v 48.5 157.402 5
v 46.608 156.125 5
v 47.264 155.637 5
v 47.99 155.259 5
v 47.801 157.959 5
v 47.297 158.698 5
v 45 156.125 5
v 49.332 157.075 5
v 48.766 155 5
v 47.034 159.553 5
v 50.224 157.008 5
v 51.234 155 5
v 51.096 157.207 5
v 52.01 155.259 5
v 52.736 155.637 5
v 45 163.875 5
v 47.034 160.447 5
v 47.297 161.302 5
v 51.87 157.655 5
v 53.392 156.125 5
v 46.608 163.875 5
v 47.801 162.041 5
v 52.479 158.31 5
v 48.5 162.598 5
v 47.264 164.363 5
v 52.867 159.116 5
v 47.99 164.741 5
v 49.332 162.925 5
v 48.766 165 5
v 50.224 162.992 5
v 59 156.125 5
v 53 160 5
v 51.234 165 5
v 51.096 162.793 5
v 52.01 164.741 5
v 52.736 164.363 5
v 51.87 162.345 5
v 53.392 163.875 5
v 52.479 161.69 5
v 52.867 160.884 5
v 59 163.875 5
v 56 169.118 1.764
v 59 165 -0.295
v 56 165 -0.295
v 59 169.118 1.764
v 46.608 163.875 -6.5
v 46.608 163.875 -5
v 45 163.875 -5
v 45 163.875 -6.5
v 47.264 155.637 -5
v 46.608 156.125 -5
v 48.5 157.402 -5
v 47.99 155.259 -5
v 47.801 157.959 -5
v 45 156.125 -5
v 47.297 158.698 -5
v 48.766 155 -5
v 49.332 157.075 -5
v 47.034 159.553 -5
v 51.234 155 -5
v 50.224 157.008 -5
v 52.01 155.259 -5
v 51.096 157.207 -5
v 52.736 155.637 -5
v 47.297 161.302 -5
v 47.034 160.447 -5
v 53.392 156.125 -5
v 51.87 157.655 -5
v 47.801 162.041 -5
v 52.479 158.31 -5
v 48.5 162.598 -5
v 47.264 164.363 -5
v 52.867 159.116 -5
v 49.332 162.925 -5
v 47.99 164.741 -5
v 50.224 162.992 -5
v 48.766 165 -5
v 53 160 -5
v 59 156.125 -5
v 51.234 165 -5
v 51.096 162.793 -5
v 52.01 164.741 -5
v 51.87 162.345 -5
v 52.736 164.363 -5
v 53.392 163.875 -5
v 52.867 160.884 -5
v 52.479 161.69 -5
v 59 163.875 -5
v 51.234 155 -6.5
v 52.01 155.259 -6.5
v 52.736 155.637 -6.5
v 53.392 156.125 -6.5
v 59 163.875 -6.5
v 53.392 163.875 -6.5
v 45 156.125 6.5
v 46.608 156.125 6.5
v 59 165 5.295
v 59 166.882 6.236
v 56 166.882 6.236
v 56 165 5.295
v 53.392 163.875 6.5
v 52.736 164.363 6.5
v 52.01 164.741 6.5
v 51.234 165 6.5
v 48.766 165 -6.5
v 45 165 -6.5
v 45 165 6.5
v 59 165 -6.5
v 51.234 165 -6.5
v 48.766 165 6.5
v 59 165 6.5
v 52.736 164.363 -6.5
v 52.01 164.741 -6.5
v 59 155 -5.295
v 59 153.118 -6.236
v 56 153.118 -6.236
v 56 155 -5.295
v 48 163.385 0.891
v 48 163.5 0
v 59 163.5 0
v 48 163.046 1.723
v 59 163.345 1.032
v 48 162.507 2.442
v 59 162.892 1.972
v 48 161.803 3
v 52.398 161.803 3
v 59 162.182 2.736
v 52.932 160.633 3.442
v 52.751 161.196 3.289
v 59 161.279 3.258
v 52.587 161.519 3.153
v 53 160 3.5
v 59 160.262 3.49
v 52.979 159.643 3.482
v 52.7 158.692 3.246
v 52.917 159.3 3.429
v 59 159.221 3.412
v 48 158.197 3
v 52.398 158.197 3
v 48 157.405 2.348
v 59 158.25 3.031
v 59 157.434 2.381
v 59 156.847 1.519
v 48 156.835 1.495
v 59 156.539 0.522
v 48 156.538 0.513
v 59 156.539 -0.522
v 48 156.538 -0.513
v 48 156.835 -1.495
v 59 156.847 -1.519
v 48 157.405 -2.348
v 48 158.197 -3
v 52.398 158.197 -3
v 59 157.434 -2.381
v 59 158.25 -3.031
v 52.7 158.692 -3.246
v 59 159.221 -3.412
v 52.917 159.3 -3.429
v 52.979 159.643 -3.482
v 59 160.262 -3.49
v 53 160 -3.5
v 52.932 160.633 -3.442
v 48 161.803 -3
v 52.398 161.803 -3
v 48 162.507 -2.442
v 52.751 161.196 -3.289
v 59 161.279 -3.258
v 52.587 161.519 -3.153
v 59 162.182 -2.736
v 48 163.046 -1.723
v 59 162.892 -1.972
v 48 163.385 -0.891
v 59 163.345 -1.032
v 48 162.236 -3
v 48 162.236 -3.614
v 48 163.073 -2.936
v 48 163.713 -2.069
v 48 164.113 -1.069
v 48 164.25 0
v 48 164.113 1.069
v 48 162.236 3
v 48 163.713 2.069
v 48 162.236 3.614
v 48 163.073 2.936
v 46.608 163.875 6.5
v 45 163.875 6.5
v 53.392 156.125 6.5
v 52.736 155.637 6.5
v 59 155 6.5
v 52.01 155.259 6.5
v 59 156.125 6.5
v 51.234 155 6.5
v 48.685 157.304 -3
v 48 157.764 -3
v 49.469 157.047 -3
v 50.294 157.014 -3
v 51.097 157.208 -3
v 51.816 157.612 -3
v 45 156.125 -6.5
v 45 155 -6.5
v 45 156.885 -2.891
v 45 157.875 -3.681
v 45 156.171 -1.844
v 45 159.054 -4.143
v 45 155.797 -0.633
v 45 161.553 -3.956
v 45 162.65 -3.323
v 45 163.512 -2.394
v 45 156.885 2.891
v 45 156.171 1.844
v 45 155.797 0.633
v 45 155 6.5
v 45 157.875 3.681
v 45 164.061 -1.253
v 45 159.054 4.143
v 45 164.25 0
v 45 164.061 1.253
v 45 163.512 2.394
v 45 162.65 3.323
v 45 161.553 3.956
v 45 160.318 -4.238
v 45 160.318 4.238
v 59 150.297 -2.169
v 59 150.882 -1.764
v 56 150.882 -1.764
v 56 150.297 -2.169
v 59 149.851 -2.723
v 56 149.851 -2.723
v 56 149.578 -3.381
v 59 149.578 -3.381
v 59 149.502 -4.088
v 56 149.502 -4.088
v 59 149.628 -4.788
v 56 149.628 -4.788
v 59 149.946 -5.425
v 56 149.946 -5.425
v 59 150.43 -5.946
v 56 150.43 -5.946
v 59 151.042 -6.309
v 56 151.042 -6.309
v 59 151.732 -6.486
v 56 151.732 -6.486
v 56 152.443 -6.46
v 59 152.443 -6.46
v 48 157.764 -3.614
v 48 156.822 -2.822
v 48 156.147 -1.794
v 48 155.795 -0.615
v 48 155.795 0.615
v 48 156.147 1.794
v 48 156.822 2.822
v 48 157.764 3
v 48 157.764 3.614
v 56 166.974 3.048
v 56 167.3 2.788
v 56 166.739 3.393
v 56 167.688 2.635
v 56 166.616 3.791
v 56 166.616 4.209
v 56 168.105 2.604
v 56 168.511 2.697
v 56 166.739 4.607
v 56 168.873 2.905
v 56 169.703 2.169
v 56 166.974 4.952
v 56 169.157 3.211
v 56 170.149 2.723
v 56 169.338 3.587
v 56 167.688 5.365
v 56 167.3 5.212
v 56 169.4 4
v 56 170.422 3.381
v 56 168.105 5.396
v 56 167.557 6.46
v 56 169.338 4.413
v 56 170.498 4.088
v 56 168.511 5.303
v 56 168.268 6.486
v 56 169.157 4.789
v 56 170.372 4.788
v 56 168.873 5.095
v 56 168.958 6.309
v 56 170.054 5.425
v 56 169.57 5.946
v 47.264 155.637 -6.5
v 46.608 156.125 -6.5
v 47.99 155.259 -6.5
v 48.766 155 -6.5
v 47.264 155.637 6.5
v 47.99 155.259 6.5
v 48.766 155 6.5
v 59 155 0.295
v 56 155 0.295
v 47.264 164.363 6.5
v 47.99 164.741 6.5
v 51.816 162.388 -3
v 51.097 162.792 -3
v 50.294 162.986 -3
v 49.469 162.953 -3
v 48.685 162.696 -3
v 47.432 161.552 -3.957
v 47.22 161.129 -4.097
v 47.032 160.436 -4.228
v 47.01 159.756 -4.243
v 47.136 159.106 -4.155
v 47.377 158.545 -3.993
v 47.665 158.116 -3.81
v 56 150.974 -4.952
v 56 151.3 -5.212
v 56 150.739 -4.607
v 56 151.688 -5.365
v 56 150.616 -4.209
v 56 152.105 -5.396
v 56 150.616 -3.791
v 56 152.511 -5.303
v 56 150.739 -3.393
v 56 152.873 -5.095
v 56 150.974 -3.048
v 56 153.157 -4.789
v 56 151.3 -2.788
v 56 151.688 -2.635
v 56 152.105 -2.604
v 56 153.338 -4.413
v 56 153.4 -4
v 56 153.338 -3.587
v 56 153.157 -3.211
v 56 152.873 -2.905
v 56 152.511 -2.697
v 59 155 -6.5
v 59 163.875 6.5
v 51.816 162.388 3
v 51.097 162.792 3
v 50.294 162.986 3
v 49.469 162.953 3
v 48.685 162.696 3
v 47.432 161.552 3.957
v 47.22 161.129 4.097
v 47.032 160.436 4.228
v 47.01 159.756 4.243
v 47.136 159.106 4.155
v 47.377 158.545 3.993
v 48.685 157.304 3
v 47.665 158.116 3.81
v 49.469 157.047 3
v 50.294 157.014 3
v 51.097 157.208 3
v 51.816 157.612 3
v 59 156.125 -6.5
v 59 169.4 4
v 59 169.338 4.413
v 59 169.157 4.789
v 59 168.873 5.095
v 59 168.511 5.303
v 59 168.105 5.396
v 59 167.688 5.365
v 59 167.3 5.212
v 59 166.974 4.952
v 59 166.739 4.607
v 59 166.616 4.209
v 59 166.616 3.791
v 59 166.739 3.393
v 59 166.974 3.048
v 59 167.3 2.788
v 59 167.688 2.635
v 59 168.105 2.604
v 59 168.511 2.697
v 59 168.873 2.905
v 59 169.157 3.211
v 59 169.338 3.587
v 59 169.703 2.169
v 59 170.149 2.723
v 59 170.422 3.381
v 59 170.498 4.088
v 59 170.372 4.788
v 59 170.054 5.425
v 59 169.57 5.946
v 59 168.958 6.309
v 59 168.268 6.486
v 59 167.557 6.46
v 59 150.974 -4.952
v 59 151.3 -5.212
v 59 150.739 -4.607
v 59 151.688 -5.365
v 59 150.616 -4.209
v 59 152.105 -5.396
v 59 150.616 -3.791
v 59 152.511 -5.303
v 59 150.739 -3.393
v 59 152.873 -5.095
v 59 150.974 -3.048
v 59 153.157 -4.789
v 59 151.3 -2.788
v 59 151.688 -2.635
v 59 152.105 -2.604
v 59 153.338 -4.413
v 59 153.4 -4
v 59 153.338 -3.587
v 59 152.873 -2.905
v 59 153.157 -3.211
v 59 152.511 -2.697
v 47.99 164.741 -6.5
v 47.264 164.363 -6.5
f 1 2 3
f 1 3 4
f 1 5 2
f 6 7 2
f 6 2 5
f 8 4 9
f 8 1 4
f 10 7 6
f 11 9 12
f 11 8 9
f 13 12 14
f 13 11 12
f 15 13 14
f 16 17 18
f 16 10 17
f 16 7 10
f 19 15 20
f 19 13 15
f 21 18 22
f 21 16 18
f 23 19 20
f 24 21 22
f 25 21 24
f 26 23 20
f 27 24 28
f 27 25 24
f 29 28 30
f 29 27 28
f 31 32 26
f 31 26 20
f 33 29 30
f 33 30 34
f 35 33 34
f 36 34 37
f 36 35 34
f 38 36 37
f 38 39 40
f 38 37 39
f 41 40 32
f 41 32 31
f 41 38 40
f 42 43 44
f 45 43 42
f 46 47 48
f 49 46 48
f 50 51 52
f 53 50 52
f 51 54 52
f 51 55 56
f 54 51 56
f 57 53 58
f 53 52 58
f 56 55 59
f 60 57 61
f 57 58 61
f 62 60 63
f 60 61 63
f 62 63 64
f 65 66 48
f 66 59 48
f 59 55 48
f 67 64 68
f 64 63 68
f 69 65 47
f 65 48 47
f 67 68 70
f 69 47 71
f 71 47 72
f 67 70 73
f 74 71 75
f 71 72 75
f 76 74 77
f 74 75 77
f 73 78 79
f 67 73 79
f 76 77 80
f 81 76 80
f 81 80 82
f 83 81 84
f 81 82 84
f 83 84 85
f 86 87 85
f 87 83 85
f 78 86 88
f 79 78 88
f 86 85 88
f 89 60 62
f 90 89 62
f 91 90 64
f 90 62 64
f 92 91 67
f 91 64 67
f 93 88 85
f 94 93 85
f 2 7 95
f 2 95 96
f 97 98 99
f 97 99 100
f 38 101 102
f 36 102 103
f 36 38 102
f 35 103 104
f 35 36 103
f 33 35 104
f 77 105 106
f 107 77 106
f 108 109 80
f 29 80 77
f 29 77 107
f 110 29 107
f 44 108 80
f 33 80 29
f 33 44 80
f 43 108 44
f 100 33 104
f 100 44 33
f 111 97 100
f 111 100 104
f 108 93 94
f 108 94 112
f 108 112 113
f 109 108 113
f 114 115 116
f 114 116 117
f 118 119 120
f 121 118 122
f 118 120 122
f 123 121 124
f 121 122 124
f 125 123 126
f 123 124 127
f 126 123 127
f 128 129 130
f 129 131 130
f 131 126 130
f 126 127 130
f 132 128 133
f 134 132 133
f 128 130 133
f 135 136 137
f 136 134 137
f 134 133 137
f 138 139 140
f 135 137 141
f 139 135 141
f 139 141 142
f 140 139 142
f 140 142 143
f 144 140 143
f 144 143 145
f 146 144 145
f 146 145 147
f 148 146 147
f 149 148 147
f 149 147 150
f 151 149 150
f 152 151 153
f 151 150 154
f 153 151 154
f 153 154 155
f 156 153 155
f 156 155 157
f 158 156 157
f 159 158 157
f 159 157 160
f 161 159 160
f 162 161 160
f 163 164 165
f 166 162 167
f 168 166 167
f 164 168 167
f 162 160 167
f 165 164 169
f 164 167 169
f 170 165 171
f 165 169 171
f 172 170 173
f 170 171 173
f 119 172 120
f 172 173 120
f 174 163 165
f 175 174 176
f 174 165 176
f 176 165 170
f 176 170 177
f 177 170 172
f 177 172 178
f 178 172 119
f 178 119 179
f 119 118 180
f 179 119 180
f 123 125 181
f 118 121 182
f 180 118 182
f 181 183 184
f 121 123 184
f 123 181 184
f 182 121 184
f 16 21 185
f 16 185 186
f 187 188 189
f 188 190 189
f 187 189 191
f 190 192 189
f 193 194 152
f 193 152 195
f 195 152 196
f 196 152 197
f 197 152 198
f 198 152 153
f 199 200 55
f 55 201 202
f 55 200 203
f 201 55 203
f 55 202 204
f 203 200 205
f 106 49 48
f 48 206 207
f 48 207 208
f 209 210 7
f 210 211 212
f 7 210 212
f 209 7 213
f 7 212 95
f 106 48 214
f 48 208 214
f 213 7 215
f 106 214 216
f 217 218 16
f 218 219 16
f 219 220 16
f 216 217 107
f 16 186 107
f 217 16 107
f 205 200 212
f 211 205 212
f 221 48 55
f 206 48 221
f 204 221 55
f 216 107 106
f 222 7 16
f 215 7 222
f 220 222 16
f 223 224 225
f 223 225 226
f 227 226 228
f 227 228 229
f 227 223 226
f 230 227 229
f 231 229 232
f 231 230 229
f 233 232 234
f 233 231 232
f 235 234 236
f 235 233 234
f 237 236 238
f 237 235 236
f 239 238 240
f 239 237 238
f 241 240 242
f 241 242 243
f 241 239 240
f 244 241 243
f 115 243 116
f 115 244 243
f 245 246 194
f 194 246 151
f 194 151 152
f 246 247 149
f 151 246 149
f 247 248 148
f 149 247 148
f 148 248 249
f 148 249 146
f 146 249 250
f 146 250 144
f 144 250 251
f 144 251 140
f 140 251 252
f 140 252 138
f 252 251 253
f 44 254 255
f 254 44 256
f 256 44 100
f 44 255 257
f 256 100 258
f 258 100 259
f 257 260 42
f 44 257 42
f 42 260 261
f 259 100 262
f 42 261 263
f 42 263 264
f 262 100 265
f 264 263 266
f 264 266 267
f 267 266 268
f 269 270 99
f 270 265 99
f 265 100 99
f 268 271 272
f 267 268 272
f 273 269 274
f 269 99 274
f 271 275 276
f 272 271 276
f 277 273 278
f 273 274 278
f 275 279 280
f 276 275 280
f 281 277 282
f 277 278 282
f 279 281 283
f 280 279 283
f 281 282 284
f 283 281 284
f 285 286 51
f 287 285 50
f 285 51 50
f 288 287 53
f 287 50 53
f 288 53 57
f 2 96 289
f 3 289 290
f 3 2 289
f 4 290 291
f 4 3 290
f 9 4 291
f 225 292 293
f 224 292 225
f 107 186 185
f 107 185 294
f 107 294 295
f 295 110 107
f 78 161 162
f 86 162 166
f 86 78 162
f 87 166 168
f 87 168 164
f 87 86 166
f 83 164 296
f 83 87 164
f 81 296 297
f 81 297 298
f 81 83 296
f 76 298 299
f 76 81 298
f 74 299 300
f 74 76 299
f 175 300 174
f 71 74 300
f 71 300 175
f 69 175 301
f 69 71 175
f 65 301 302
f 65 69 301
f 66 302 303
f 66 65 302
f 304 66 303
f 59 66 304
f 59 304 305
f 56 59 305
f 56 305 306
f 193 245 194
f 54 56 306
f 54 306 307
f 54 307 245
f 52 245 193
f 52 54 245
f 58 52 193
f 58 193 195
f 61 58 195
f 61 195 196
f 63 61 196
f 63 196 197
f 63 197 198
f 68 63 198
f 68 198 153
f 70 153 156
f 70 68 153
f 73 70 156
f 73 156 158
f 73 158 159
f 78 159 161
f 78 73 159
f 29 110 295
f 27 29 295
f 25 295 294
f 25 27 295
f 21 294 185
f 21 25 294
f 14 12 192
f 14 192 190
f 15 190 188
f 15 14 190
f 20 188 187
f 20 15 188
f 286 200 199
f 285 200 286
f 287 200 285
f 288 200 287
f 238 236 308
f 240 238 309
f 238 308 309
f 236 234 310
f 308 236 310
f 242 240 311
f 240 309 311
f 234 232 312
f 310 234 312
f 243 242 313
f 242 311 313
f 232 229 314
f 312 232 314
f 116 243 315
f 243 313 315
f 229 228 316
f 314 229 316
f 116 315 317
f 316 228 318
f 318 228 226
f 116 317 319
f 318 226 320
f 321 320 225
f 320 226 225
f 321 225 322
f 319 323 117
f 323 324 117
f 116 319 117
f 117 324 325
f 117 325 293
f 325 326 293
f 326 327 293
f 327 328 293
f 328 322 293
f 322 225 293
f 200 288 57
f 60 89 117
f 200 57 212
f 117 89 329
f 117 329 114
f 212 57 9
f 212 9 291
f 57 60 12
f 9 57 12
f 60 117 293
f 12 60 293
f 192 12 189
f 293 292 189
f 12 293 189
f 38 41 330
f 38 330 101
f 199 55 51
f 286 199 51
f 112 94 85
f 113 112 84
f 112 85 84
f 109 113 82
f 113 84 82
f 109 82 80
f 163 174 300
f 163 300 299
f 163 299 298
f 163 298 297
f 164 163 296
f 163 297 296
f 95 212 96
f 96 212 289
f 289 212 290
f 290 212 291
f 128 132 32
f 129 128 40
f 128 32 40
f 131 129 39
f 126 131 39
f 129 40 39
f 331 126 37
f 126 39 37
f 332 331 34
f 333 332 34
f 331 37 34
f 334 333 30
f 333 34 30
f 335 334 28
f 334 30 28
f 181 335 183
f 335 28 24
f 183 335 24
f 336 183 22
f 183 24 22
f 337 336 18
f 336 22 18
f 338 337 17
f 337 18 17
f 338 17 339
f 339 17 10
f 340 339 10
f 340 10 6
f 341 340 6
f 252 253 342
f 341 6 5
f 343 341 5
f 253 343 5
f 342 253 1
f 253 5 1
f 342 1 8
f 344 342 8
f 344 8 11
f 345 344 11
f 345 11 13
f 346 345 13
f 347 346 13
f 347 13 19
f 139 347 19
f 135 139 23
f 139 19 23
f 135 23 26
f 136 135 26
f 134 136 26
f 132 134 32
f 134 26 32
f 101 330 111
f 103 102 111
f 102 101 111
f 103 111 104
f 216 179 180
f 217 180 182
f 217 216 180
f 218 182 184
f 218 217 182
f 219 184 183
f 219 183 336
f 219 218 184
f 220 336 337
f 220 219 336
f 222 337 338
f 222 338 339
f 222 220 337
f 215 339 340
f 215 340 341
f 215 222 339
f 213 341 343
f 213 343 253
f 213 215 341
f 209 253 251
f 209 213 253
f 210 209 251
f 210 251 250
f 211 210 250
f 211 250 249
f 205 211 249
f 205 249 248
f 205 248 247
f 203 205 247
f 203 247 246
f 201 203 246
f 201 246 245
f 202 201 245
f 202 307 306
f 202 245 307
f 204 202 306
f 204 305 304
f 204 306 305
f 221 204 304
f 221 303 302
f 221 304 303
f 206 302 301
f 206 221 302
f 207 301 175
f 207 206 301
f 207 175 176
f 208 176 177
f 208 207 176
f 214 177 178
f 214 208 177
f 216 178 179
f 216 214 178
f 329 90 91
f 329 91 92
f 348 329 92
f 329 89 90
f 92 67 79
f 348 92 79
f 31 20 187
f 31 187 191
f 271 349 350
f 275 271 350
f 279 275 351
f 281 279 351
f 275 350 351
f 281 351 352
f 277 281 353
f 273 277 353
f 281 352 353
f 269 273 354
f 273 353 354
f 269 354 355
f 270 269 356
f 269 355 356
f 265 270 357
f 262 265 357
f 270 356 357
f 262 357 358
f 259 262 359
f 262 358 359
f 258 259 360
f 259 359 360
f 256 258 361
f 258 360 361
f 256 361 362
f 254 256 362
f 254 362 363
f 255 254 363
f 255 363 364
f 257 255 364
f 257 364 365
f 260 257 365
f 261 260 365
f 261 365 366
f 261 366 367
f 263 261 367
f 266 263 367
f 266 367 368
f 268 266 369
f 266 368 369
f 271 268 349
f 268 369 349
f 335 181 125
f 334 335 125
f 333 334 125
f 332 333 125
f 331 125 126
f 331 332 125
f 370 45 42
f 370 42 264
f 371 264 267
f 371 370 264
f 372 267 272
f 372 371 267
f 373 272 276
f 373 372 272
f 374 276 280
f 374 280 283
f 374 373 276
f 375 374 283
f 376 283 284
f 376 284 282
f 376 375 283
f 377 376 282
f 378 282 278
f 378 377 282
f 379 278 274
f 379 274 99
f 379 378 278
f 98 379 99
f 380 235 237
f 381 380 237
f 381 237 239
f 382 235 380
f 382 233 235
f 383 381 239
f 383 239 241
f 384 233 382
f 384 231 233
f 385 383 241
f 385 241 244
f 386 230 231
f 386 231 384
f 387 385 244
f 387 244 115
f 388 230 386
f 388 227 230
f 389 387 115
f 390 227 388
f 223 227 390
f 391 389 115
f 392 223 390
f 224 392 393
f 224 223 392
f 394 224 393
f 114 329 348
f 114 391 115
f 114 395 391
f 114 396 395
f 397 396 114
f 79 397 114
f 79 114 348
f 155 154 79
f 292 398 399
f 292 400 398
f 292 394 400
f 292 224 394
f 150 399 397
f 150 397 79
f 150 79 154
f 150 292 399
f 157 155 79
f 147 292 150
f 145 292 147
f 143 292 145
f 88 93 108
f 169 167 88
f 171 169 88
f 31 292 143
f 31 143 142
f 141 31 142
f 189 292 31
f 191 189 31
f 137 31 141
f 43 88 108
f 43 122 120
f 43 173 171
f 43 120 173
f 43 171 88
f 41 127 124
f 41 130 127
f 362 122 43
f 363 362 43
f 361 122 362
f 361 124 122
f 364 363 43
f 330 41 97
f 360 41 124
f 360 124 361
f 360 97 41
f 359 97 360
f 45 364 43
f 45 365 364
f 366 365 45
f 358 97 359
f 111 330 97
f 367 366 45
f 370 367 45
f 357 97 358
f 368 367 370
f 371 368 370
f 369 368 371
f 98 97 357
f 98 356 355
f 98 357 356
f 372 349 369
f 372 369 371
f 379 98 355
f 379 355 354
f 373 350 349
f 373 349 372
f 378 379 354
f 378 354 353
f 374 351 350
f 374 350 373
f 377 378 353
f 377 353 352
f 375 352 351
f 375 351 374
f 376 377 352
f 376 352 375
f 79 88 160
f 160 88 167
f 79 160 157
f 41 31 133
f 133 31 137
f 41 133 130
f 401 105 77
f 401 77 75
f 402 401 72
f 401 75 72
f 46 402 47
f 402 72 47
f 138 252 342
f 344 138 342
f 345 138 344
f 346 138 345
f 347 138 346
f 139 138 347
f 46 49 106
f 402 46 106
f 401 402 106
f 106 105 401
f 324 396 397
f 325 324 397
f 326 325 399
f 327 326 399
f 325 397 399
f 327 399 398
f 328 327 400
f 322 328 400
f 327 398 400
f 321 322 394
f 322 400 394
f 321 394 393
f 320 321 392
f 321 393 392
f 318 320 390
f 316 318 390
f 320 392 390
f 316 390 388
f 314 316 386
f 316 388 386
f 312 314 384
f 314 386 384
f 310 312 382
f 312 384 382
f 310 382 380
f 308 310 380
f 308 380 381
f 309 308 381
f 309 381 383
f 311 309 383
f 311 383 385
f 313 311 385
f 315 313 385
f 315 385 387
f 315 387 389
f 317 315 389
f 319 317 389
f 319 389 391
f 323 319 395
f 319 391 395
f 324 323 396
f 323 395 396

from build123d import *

# Parameters (mm, degrees)
SKETCH215_R     = 3
PAD127051_DEPTH = 2
PAD127048_DEPTH = 3
PAD127047_DEPTH = 3
SKETCH209_R     = 3.5
PAD127045_DEPTH = 30
SKETCH210_R     = 4.25
PAD127046_DEPTH = 3
SKETCH216_R     = 3
PAD127052_DEPTH = 2
SKETCH208_W     = 10
SKETCH208_H     = 13
PAD127044_DEPTH = 14
SKETCH207_R     = 1.4
PAD127043_DEPTH = 3


with BuildPart() as countersinktop:
    # Sketch215 → Pad127051 (new body)
    with BuildSketch(Plane(origin=(50, 160, 5), x_dir=(1, 0, 0), z_dir=(0, 0, 1))):
        Circle(SKETCH215_R)
    extrude(amount=-PAD127051_DEPTH)


with BuildPart() as steeringrodcutoutbottom:
    # Sketch212 → Pad127048 (new body)
    with BuildSketch(Plane(origin=(50, 160, -5), x_dir=(1, 0, 0), z_dir=(0, 0, 1))):
        with BuildLine():
            Line((9, 3.875), (3.392179, 3.875))
            ThreePointArc((3.392179, 3.875), (0, 5.15), (-3.392179, 3.875))
            Line((-3.392179, 3.875), (-8, 3.875))
            Line((-8, 3.875), (-8, -3.875))
            Line((-8, -3.875), (-3.392179, -3.875))
            ThreePointArc((-3.392179, -3.875), (0, -5.15), (3.392179, -3.875))
            Line((3.392179, -3.875), (9, -3.875))
            Line((9, -2.5), (9, -3.875))
            Line((12, -2.5), (9, -2.5))
            Line((12, 2.5), (12, -2.5))
            Line((9, 2.5), (12, 2.5))
            Line((9, 3.875), (9, 2.5))
        make_face()
    extrude(amount=-PAD127048_DEPTH)


with BuildPart() as steeringrodcutouttop:
    # Sketch211 → Pad127047 (new body)
    with BuildSketch(Plane(origin=(50, 160, 5), x_dir=(1, 0, 0), z_dir=(0, 0, 1))):
        with BuildLine():
            Line((9, 3.875), (3.392179, 3.875))
            ThreePointArc((3.392179, 3.875), (0, 5.15), (-3.392179, 3.875))
            Line((-3.392179, 3.875), (-8, 3.875))
            Line((-8, 3.875), (-8, -3.875))
            Line((-8, -3.875), (-3.392179, -3.875))
            ThreePointArc((-3.392179, -3.875), (0, -5.15), (3.392179, -3.875))
            Line((3.392179, -3.875), (9, -3.875))
            Line((9, -2.5), (9, -3.875))
            Line((12, -2.5), (9, -2.5))
            Line((12, 2.5), (12, -2.5))
            Line((9, 2.5), (12, 2.5))
            Line((9, 3.875), (9, 2.5))
        make_face()
    extrude(amount=PAD127047_DEPTH)


with BuildPart() as axlecutout:
    # Sketch209 → Pad127045 (new body)
    with BuildSketch(Plane(origin=(59, 160, 0), x_dir=(0, 1, 0), z_dir=(1, 0, 0))):
        Circle(SKETCH209_R)
    extrude(amount=-PAD127045_DEPTH)


with BuildPart() as bearingcutout:
    # Sketch210 → Pad127046 (new body)
    with BuildSketch(Plane(origin=(45, 160, 0), x_dir=(0, 1, 0), z_dir=(1, 0, 0))):
        Circle(SKETCH210_R)
    extrude(amount=PAD127046_DEPTH)


with BuildPart() as cutouts:
    # Sketch216 → Pad127052 (new body)
    with BuildSketch(Plane(origin=(50, 160, -5), x_dir=(1, 0, 0), z_dir=(0, 0, 1))):
        Circle(SKETCH216_R)
    extrude(amount=PAD127052_DEPTH)

    # Fusion004020029: union CountersinkTop, SteeringRodCutoutBottom, SteeringRodCutoutTop, AxleCutout, BearingCutout
    add(countersinktop.part)
    add(steeringrodcutoutbottom.part)
    add(steeringrodcutouttop.part)
    add(axlecutout.part)
    add(bearingcutout.part)


with BuildPart() as mainbody:
    # Sketch208 → Pad127044 (new body)
    with BuildSketch(Plane(origin=(59, 160, 0), x_dir=(0, 1, 0), z_dir=(1, 0, 0))):
        Rectangle(SKETCH208_W, SKETCH208_H)
    extrude(amount=-PAD127044_DEPTH)


with BuildPart() as steeringcolumn:
    # Sketch207 → Pad127043 (new body)
    with BuildSketch(Plane(origin=(59, 160, 0), x_dir=(0, 1, 0), z_dir=(1, 0, 0))):
        with BuildLine():
            ThreePointArc((9.118035, 1.763933), (10.236068, 5.118034), (6.881967, 6.236069))
            Line((6.881967, 6.236069), (-9.118034, -1.763932))
            ThreePointArc((-9.118034, -1.763932), (-10.236068, -5.118034), (-6.881966, -6.236068))
            Line((-6.881966, -6.236068), (9.118035, 1.763933))
        make_face()
        with Locations((8, 4)):
            Circle(SKETCH207_R, mode=Mode.SUBTRACT)
        with Locations((-8, -4)):
            Circle(SKETCH207_R, mode=Mode.SUBTRACT)
    extrude(amount=-PAD127043_DEPTH)

    # Fusion004020028: union MainBody
    add(mainbody.part)

    # Cut007019028: cut cutouts
    add(cutouts.part, mode=Mode.SUBTRACT)


solid = steeringcolumn.part
